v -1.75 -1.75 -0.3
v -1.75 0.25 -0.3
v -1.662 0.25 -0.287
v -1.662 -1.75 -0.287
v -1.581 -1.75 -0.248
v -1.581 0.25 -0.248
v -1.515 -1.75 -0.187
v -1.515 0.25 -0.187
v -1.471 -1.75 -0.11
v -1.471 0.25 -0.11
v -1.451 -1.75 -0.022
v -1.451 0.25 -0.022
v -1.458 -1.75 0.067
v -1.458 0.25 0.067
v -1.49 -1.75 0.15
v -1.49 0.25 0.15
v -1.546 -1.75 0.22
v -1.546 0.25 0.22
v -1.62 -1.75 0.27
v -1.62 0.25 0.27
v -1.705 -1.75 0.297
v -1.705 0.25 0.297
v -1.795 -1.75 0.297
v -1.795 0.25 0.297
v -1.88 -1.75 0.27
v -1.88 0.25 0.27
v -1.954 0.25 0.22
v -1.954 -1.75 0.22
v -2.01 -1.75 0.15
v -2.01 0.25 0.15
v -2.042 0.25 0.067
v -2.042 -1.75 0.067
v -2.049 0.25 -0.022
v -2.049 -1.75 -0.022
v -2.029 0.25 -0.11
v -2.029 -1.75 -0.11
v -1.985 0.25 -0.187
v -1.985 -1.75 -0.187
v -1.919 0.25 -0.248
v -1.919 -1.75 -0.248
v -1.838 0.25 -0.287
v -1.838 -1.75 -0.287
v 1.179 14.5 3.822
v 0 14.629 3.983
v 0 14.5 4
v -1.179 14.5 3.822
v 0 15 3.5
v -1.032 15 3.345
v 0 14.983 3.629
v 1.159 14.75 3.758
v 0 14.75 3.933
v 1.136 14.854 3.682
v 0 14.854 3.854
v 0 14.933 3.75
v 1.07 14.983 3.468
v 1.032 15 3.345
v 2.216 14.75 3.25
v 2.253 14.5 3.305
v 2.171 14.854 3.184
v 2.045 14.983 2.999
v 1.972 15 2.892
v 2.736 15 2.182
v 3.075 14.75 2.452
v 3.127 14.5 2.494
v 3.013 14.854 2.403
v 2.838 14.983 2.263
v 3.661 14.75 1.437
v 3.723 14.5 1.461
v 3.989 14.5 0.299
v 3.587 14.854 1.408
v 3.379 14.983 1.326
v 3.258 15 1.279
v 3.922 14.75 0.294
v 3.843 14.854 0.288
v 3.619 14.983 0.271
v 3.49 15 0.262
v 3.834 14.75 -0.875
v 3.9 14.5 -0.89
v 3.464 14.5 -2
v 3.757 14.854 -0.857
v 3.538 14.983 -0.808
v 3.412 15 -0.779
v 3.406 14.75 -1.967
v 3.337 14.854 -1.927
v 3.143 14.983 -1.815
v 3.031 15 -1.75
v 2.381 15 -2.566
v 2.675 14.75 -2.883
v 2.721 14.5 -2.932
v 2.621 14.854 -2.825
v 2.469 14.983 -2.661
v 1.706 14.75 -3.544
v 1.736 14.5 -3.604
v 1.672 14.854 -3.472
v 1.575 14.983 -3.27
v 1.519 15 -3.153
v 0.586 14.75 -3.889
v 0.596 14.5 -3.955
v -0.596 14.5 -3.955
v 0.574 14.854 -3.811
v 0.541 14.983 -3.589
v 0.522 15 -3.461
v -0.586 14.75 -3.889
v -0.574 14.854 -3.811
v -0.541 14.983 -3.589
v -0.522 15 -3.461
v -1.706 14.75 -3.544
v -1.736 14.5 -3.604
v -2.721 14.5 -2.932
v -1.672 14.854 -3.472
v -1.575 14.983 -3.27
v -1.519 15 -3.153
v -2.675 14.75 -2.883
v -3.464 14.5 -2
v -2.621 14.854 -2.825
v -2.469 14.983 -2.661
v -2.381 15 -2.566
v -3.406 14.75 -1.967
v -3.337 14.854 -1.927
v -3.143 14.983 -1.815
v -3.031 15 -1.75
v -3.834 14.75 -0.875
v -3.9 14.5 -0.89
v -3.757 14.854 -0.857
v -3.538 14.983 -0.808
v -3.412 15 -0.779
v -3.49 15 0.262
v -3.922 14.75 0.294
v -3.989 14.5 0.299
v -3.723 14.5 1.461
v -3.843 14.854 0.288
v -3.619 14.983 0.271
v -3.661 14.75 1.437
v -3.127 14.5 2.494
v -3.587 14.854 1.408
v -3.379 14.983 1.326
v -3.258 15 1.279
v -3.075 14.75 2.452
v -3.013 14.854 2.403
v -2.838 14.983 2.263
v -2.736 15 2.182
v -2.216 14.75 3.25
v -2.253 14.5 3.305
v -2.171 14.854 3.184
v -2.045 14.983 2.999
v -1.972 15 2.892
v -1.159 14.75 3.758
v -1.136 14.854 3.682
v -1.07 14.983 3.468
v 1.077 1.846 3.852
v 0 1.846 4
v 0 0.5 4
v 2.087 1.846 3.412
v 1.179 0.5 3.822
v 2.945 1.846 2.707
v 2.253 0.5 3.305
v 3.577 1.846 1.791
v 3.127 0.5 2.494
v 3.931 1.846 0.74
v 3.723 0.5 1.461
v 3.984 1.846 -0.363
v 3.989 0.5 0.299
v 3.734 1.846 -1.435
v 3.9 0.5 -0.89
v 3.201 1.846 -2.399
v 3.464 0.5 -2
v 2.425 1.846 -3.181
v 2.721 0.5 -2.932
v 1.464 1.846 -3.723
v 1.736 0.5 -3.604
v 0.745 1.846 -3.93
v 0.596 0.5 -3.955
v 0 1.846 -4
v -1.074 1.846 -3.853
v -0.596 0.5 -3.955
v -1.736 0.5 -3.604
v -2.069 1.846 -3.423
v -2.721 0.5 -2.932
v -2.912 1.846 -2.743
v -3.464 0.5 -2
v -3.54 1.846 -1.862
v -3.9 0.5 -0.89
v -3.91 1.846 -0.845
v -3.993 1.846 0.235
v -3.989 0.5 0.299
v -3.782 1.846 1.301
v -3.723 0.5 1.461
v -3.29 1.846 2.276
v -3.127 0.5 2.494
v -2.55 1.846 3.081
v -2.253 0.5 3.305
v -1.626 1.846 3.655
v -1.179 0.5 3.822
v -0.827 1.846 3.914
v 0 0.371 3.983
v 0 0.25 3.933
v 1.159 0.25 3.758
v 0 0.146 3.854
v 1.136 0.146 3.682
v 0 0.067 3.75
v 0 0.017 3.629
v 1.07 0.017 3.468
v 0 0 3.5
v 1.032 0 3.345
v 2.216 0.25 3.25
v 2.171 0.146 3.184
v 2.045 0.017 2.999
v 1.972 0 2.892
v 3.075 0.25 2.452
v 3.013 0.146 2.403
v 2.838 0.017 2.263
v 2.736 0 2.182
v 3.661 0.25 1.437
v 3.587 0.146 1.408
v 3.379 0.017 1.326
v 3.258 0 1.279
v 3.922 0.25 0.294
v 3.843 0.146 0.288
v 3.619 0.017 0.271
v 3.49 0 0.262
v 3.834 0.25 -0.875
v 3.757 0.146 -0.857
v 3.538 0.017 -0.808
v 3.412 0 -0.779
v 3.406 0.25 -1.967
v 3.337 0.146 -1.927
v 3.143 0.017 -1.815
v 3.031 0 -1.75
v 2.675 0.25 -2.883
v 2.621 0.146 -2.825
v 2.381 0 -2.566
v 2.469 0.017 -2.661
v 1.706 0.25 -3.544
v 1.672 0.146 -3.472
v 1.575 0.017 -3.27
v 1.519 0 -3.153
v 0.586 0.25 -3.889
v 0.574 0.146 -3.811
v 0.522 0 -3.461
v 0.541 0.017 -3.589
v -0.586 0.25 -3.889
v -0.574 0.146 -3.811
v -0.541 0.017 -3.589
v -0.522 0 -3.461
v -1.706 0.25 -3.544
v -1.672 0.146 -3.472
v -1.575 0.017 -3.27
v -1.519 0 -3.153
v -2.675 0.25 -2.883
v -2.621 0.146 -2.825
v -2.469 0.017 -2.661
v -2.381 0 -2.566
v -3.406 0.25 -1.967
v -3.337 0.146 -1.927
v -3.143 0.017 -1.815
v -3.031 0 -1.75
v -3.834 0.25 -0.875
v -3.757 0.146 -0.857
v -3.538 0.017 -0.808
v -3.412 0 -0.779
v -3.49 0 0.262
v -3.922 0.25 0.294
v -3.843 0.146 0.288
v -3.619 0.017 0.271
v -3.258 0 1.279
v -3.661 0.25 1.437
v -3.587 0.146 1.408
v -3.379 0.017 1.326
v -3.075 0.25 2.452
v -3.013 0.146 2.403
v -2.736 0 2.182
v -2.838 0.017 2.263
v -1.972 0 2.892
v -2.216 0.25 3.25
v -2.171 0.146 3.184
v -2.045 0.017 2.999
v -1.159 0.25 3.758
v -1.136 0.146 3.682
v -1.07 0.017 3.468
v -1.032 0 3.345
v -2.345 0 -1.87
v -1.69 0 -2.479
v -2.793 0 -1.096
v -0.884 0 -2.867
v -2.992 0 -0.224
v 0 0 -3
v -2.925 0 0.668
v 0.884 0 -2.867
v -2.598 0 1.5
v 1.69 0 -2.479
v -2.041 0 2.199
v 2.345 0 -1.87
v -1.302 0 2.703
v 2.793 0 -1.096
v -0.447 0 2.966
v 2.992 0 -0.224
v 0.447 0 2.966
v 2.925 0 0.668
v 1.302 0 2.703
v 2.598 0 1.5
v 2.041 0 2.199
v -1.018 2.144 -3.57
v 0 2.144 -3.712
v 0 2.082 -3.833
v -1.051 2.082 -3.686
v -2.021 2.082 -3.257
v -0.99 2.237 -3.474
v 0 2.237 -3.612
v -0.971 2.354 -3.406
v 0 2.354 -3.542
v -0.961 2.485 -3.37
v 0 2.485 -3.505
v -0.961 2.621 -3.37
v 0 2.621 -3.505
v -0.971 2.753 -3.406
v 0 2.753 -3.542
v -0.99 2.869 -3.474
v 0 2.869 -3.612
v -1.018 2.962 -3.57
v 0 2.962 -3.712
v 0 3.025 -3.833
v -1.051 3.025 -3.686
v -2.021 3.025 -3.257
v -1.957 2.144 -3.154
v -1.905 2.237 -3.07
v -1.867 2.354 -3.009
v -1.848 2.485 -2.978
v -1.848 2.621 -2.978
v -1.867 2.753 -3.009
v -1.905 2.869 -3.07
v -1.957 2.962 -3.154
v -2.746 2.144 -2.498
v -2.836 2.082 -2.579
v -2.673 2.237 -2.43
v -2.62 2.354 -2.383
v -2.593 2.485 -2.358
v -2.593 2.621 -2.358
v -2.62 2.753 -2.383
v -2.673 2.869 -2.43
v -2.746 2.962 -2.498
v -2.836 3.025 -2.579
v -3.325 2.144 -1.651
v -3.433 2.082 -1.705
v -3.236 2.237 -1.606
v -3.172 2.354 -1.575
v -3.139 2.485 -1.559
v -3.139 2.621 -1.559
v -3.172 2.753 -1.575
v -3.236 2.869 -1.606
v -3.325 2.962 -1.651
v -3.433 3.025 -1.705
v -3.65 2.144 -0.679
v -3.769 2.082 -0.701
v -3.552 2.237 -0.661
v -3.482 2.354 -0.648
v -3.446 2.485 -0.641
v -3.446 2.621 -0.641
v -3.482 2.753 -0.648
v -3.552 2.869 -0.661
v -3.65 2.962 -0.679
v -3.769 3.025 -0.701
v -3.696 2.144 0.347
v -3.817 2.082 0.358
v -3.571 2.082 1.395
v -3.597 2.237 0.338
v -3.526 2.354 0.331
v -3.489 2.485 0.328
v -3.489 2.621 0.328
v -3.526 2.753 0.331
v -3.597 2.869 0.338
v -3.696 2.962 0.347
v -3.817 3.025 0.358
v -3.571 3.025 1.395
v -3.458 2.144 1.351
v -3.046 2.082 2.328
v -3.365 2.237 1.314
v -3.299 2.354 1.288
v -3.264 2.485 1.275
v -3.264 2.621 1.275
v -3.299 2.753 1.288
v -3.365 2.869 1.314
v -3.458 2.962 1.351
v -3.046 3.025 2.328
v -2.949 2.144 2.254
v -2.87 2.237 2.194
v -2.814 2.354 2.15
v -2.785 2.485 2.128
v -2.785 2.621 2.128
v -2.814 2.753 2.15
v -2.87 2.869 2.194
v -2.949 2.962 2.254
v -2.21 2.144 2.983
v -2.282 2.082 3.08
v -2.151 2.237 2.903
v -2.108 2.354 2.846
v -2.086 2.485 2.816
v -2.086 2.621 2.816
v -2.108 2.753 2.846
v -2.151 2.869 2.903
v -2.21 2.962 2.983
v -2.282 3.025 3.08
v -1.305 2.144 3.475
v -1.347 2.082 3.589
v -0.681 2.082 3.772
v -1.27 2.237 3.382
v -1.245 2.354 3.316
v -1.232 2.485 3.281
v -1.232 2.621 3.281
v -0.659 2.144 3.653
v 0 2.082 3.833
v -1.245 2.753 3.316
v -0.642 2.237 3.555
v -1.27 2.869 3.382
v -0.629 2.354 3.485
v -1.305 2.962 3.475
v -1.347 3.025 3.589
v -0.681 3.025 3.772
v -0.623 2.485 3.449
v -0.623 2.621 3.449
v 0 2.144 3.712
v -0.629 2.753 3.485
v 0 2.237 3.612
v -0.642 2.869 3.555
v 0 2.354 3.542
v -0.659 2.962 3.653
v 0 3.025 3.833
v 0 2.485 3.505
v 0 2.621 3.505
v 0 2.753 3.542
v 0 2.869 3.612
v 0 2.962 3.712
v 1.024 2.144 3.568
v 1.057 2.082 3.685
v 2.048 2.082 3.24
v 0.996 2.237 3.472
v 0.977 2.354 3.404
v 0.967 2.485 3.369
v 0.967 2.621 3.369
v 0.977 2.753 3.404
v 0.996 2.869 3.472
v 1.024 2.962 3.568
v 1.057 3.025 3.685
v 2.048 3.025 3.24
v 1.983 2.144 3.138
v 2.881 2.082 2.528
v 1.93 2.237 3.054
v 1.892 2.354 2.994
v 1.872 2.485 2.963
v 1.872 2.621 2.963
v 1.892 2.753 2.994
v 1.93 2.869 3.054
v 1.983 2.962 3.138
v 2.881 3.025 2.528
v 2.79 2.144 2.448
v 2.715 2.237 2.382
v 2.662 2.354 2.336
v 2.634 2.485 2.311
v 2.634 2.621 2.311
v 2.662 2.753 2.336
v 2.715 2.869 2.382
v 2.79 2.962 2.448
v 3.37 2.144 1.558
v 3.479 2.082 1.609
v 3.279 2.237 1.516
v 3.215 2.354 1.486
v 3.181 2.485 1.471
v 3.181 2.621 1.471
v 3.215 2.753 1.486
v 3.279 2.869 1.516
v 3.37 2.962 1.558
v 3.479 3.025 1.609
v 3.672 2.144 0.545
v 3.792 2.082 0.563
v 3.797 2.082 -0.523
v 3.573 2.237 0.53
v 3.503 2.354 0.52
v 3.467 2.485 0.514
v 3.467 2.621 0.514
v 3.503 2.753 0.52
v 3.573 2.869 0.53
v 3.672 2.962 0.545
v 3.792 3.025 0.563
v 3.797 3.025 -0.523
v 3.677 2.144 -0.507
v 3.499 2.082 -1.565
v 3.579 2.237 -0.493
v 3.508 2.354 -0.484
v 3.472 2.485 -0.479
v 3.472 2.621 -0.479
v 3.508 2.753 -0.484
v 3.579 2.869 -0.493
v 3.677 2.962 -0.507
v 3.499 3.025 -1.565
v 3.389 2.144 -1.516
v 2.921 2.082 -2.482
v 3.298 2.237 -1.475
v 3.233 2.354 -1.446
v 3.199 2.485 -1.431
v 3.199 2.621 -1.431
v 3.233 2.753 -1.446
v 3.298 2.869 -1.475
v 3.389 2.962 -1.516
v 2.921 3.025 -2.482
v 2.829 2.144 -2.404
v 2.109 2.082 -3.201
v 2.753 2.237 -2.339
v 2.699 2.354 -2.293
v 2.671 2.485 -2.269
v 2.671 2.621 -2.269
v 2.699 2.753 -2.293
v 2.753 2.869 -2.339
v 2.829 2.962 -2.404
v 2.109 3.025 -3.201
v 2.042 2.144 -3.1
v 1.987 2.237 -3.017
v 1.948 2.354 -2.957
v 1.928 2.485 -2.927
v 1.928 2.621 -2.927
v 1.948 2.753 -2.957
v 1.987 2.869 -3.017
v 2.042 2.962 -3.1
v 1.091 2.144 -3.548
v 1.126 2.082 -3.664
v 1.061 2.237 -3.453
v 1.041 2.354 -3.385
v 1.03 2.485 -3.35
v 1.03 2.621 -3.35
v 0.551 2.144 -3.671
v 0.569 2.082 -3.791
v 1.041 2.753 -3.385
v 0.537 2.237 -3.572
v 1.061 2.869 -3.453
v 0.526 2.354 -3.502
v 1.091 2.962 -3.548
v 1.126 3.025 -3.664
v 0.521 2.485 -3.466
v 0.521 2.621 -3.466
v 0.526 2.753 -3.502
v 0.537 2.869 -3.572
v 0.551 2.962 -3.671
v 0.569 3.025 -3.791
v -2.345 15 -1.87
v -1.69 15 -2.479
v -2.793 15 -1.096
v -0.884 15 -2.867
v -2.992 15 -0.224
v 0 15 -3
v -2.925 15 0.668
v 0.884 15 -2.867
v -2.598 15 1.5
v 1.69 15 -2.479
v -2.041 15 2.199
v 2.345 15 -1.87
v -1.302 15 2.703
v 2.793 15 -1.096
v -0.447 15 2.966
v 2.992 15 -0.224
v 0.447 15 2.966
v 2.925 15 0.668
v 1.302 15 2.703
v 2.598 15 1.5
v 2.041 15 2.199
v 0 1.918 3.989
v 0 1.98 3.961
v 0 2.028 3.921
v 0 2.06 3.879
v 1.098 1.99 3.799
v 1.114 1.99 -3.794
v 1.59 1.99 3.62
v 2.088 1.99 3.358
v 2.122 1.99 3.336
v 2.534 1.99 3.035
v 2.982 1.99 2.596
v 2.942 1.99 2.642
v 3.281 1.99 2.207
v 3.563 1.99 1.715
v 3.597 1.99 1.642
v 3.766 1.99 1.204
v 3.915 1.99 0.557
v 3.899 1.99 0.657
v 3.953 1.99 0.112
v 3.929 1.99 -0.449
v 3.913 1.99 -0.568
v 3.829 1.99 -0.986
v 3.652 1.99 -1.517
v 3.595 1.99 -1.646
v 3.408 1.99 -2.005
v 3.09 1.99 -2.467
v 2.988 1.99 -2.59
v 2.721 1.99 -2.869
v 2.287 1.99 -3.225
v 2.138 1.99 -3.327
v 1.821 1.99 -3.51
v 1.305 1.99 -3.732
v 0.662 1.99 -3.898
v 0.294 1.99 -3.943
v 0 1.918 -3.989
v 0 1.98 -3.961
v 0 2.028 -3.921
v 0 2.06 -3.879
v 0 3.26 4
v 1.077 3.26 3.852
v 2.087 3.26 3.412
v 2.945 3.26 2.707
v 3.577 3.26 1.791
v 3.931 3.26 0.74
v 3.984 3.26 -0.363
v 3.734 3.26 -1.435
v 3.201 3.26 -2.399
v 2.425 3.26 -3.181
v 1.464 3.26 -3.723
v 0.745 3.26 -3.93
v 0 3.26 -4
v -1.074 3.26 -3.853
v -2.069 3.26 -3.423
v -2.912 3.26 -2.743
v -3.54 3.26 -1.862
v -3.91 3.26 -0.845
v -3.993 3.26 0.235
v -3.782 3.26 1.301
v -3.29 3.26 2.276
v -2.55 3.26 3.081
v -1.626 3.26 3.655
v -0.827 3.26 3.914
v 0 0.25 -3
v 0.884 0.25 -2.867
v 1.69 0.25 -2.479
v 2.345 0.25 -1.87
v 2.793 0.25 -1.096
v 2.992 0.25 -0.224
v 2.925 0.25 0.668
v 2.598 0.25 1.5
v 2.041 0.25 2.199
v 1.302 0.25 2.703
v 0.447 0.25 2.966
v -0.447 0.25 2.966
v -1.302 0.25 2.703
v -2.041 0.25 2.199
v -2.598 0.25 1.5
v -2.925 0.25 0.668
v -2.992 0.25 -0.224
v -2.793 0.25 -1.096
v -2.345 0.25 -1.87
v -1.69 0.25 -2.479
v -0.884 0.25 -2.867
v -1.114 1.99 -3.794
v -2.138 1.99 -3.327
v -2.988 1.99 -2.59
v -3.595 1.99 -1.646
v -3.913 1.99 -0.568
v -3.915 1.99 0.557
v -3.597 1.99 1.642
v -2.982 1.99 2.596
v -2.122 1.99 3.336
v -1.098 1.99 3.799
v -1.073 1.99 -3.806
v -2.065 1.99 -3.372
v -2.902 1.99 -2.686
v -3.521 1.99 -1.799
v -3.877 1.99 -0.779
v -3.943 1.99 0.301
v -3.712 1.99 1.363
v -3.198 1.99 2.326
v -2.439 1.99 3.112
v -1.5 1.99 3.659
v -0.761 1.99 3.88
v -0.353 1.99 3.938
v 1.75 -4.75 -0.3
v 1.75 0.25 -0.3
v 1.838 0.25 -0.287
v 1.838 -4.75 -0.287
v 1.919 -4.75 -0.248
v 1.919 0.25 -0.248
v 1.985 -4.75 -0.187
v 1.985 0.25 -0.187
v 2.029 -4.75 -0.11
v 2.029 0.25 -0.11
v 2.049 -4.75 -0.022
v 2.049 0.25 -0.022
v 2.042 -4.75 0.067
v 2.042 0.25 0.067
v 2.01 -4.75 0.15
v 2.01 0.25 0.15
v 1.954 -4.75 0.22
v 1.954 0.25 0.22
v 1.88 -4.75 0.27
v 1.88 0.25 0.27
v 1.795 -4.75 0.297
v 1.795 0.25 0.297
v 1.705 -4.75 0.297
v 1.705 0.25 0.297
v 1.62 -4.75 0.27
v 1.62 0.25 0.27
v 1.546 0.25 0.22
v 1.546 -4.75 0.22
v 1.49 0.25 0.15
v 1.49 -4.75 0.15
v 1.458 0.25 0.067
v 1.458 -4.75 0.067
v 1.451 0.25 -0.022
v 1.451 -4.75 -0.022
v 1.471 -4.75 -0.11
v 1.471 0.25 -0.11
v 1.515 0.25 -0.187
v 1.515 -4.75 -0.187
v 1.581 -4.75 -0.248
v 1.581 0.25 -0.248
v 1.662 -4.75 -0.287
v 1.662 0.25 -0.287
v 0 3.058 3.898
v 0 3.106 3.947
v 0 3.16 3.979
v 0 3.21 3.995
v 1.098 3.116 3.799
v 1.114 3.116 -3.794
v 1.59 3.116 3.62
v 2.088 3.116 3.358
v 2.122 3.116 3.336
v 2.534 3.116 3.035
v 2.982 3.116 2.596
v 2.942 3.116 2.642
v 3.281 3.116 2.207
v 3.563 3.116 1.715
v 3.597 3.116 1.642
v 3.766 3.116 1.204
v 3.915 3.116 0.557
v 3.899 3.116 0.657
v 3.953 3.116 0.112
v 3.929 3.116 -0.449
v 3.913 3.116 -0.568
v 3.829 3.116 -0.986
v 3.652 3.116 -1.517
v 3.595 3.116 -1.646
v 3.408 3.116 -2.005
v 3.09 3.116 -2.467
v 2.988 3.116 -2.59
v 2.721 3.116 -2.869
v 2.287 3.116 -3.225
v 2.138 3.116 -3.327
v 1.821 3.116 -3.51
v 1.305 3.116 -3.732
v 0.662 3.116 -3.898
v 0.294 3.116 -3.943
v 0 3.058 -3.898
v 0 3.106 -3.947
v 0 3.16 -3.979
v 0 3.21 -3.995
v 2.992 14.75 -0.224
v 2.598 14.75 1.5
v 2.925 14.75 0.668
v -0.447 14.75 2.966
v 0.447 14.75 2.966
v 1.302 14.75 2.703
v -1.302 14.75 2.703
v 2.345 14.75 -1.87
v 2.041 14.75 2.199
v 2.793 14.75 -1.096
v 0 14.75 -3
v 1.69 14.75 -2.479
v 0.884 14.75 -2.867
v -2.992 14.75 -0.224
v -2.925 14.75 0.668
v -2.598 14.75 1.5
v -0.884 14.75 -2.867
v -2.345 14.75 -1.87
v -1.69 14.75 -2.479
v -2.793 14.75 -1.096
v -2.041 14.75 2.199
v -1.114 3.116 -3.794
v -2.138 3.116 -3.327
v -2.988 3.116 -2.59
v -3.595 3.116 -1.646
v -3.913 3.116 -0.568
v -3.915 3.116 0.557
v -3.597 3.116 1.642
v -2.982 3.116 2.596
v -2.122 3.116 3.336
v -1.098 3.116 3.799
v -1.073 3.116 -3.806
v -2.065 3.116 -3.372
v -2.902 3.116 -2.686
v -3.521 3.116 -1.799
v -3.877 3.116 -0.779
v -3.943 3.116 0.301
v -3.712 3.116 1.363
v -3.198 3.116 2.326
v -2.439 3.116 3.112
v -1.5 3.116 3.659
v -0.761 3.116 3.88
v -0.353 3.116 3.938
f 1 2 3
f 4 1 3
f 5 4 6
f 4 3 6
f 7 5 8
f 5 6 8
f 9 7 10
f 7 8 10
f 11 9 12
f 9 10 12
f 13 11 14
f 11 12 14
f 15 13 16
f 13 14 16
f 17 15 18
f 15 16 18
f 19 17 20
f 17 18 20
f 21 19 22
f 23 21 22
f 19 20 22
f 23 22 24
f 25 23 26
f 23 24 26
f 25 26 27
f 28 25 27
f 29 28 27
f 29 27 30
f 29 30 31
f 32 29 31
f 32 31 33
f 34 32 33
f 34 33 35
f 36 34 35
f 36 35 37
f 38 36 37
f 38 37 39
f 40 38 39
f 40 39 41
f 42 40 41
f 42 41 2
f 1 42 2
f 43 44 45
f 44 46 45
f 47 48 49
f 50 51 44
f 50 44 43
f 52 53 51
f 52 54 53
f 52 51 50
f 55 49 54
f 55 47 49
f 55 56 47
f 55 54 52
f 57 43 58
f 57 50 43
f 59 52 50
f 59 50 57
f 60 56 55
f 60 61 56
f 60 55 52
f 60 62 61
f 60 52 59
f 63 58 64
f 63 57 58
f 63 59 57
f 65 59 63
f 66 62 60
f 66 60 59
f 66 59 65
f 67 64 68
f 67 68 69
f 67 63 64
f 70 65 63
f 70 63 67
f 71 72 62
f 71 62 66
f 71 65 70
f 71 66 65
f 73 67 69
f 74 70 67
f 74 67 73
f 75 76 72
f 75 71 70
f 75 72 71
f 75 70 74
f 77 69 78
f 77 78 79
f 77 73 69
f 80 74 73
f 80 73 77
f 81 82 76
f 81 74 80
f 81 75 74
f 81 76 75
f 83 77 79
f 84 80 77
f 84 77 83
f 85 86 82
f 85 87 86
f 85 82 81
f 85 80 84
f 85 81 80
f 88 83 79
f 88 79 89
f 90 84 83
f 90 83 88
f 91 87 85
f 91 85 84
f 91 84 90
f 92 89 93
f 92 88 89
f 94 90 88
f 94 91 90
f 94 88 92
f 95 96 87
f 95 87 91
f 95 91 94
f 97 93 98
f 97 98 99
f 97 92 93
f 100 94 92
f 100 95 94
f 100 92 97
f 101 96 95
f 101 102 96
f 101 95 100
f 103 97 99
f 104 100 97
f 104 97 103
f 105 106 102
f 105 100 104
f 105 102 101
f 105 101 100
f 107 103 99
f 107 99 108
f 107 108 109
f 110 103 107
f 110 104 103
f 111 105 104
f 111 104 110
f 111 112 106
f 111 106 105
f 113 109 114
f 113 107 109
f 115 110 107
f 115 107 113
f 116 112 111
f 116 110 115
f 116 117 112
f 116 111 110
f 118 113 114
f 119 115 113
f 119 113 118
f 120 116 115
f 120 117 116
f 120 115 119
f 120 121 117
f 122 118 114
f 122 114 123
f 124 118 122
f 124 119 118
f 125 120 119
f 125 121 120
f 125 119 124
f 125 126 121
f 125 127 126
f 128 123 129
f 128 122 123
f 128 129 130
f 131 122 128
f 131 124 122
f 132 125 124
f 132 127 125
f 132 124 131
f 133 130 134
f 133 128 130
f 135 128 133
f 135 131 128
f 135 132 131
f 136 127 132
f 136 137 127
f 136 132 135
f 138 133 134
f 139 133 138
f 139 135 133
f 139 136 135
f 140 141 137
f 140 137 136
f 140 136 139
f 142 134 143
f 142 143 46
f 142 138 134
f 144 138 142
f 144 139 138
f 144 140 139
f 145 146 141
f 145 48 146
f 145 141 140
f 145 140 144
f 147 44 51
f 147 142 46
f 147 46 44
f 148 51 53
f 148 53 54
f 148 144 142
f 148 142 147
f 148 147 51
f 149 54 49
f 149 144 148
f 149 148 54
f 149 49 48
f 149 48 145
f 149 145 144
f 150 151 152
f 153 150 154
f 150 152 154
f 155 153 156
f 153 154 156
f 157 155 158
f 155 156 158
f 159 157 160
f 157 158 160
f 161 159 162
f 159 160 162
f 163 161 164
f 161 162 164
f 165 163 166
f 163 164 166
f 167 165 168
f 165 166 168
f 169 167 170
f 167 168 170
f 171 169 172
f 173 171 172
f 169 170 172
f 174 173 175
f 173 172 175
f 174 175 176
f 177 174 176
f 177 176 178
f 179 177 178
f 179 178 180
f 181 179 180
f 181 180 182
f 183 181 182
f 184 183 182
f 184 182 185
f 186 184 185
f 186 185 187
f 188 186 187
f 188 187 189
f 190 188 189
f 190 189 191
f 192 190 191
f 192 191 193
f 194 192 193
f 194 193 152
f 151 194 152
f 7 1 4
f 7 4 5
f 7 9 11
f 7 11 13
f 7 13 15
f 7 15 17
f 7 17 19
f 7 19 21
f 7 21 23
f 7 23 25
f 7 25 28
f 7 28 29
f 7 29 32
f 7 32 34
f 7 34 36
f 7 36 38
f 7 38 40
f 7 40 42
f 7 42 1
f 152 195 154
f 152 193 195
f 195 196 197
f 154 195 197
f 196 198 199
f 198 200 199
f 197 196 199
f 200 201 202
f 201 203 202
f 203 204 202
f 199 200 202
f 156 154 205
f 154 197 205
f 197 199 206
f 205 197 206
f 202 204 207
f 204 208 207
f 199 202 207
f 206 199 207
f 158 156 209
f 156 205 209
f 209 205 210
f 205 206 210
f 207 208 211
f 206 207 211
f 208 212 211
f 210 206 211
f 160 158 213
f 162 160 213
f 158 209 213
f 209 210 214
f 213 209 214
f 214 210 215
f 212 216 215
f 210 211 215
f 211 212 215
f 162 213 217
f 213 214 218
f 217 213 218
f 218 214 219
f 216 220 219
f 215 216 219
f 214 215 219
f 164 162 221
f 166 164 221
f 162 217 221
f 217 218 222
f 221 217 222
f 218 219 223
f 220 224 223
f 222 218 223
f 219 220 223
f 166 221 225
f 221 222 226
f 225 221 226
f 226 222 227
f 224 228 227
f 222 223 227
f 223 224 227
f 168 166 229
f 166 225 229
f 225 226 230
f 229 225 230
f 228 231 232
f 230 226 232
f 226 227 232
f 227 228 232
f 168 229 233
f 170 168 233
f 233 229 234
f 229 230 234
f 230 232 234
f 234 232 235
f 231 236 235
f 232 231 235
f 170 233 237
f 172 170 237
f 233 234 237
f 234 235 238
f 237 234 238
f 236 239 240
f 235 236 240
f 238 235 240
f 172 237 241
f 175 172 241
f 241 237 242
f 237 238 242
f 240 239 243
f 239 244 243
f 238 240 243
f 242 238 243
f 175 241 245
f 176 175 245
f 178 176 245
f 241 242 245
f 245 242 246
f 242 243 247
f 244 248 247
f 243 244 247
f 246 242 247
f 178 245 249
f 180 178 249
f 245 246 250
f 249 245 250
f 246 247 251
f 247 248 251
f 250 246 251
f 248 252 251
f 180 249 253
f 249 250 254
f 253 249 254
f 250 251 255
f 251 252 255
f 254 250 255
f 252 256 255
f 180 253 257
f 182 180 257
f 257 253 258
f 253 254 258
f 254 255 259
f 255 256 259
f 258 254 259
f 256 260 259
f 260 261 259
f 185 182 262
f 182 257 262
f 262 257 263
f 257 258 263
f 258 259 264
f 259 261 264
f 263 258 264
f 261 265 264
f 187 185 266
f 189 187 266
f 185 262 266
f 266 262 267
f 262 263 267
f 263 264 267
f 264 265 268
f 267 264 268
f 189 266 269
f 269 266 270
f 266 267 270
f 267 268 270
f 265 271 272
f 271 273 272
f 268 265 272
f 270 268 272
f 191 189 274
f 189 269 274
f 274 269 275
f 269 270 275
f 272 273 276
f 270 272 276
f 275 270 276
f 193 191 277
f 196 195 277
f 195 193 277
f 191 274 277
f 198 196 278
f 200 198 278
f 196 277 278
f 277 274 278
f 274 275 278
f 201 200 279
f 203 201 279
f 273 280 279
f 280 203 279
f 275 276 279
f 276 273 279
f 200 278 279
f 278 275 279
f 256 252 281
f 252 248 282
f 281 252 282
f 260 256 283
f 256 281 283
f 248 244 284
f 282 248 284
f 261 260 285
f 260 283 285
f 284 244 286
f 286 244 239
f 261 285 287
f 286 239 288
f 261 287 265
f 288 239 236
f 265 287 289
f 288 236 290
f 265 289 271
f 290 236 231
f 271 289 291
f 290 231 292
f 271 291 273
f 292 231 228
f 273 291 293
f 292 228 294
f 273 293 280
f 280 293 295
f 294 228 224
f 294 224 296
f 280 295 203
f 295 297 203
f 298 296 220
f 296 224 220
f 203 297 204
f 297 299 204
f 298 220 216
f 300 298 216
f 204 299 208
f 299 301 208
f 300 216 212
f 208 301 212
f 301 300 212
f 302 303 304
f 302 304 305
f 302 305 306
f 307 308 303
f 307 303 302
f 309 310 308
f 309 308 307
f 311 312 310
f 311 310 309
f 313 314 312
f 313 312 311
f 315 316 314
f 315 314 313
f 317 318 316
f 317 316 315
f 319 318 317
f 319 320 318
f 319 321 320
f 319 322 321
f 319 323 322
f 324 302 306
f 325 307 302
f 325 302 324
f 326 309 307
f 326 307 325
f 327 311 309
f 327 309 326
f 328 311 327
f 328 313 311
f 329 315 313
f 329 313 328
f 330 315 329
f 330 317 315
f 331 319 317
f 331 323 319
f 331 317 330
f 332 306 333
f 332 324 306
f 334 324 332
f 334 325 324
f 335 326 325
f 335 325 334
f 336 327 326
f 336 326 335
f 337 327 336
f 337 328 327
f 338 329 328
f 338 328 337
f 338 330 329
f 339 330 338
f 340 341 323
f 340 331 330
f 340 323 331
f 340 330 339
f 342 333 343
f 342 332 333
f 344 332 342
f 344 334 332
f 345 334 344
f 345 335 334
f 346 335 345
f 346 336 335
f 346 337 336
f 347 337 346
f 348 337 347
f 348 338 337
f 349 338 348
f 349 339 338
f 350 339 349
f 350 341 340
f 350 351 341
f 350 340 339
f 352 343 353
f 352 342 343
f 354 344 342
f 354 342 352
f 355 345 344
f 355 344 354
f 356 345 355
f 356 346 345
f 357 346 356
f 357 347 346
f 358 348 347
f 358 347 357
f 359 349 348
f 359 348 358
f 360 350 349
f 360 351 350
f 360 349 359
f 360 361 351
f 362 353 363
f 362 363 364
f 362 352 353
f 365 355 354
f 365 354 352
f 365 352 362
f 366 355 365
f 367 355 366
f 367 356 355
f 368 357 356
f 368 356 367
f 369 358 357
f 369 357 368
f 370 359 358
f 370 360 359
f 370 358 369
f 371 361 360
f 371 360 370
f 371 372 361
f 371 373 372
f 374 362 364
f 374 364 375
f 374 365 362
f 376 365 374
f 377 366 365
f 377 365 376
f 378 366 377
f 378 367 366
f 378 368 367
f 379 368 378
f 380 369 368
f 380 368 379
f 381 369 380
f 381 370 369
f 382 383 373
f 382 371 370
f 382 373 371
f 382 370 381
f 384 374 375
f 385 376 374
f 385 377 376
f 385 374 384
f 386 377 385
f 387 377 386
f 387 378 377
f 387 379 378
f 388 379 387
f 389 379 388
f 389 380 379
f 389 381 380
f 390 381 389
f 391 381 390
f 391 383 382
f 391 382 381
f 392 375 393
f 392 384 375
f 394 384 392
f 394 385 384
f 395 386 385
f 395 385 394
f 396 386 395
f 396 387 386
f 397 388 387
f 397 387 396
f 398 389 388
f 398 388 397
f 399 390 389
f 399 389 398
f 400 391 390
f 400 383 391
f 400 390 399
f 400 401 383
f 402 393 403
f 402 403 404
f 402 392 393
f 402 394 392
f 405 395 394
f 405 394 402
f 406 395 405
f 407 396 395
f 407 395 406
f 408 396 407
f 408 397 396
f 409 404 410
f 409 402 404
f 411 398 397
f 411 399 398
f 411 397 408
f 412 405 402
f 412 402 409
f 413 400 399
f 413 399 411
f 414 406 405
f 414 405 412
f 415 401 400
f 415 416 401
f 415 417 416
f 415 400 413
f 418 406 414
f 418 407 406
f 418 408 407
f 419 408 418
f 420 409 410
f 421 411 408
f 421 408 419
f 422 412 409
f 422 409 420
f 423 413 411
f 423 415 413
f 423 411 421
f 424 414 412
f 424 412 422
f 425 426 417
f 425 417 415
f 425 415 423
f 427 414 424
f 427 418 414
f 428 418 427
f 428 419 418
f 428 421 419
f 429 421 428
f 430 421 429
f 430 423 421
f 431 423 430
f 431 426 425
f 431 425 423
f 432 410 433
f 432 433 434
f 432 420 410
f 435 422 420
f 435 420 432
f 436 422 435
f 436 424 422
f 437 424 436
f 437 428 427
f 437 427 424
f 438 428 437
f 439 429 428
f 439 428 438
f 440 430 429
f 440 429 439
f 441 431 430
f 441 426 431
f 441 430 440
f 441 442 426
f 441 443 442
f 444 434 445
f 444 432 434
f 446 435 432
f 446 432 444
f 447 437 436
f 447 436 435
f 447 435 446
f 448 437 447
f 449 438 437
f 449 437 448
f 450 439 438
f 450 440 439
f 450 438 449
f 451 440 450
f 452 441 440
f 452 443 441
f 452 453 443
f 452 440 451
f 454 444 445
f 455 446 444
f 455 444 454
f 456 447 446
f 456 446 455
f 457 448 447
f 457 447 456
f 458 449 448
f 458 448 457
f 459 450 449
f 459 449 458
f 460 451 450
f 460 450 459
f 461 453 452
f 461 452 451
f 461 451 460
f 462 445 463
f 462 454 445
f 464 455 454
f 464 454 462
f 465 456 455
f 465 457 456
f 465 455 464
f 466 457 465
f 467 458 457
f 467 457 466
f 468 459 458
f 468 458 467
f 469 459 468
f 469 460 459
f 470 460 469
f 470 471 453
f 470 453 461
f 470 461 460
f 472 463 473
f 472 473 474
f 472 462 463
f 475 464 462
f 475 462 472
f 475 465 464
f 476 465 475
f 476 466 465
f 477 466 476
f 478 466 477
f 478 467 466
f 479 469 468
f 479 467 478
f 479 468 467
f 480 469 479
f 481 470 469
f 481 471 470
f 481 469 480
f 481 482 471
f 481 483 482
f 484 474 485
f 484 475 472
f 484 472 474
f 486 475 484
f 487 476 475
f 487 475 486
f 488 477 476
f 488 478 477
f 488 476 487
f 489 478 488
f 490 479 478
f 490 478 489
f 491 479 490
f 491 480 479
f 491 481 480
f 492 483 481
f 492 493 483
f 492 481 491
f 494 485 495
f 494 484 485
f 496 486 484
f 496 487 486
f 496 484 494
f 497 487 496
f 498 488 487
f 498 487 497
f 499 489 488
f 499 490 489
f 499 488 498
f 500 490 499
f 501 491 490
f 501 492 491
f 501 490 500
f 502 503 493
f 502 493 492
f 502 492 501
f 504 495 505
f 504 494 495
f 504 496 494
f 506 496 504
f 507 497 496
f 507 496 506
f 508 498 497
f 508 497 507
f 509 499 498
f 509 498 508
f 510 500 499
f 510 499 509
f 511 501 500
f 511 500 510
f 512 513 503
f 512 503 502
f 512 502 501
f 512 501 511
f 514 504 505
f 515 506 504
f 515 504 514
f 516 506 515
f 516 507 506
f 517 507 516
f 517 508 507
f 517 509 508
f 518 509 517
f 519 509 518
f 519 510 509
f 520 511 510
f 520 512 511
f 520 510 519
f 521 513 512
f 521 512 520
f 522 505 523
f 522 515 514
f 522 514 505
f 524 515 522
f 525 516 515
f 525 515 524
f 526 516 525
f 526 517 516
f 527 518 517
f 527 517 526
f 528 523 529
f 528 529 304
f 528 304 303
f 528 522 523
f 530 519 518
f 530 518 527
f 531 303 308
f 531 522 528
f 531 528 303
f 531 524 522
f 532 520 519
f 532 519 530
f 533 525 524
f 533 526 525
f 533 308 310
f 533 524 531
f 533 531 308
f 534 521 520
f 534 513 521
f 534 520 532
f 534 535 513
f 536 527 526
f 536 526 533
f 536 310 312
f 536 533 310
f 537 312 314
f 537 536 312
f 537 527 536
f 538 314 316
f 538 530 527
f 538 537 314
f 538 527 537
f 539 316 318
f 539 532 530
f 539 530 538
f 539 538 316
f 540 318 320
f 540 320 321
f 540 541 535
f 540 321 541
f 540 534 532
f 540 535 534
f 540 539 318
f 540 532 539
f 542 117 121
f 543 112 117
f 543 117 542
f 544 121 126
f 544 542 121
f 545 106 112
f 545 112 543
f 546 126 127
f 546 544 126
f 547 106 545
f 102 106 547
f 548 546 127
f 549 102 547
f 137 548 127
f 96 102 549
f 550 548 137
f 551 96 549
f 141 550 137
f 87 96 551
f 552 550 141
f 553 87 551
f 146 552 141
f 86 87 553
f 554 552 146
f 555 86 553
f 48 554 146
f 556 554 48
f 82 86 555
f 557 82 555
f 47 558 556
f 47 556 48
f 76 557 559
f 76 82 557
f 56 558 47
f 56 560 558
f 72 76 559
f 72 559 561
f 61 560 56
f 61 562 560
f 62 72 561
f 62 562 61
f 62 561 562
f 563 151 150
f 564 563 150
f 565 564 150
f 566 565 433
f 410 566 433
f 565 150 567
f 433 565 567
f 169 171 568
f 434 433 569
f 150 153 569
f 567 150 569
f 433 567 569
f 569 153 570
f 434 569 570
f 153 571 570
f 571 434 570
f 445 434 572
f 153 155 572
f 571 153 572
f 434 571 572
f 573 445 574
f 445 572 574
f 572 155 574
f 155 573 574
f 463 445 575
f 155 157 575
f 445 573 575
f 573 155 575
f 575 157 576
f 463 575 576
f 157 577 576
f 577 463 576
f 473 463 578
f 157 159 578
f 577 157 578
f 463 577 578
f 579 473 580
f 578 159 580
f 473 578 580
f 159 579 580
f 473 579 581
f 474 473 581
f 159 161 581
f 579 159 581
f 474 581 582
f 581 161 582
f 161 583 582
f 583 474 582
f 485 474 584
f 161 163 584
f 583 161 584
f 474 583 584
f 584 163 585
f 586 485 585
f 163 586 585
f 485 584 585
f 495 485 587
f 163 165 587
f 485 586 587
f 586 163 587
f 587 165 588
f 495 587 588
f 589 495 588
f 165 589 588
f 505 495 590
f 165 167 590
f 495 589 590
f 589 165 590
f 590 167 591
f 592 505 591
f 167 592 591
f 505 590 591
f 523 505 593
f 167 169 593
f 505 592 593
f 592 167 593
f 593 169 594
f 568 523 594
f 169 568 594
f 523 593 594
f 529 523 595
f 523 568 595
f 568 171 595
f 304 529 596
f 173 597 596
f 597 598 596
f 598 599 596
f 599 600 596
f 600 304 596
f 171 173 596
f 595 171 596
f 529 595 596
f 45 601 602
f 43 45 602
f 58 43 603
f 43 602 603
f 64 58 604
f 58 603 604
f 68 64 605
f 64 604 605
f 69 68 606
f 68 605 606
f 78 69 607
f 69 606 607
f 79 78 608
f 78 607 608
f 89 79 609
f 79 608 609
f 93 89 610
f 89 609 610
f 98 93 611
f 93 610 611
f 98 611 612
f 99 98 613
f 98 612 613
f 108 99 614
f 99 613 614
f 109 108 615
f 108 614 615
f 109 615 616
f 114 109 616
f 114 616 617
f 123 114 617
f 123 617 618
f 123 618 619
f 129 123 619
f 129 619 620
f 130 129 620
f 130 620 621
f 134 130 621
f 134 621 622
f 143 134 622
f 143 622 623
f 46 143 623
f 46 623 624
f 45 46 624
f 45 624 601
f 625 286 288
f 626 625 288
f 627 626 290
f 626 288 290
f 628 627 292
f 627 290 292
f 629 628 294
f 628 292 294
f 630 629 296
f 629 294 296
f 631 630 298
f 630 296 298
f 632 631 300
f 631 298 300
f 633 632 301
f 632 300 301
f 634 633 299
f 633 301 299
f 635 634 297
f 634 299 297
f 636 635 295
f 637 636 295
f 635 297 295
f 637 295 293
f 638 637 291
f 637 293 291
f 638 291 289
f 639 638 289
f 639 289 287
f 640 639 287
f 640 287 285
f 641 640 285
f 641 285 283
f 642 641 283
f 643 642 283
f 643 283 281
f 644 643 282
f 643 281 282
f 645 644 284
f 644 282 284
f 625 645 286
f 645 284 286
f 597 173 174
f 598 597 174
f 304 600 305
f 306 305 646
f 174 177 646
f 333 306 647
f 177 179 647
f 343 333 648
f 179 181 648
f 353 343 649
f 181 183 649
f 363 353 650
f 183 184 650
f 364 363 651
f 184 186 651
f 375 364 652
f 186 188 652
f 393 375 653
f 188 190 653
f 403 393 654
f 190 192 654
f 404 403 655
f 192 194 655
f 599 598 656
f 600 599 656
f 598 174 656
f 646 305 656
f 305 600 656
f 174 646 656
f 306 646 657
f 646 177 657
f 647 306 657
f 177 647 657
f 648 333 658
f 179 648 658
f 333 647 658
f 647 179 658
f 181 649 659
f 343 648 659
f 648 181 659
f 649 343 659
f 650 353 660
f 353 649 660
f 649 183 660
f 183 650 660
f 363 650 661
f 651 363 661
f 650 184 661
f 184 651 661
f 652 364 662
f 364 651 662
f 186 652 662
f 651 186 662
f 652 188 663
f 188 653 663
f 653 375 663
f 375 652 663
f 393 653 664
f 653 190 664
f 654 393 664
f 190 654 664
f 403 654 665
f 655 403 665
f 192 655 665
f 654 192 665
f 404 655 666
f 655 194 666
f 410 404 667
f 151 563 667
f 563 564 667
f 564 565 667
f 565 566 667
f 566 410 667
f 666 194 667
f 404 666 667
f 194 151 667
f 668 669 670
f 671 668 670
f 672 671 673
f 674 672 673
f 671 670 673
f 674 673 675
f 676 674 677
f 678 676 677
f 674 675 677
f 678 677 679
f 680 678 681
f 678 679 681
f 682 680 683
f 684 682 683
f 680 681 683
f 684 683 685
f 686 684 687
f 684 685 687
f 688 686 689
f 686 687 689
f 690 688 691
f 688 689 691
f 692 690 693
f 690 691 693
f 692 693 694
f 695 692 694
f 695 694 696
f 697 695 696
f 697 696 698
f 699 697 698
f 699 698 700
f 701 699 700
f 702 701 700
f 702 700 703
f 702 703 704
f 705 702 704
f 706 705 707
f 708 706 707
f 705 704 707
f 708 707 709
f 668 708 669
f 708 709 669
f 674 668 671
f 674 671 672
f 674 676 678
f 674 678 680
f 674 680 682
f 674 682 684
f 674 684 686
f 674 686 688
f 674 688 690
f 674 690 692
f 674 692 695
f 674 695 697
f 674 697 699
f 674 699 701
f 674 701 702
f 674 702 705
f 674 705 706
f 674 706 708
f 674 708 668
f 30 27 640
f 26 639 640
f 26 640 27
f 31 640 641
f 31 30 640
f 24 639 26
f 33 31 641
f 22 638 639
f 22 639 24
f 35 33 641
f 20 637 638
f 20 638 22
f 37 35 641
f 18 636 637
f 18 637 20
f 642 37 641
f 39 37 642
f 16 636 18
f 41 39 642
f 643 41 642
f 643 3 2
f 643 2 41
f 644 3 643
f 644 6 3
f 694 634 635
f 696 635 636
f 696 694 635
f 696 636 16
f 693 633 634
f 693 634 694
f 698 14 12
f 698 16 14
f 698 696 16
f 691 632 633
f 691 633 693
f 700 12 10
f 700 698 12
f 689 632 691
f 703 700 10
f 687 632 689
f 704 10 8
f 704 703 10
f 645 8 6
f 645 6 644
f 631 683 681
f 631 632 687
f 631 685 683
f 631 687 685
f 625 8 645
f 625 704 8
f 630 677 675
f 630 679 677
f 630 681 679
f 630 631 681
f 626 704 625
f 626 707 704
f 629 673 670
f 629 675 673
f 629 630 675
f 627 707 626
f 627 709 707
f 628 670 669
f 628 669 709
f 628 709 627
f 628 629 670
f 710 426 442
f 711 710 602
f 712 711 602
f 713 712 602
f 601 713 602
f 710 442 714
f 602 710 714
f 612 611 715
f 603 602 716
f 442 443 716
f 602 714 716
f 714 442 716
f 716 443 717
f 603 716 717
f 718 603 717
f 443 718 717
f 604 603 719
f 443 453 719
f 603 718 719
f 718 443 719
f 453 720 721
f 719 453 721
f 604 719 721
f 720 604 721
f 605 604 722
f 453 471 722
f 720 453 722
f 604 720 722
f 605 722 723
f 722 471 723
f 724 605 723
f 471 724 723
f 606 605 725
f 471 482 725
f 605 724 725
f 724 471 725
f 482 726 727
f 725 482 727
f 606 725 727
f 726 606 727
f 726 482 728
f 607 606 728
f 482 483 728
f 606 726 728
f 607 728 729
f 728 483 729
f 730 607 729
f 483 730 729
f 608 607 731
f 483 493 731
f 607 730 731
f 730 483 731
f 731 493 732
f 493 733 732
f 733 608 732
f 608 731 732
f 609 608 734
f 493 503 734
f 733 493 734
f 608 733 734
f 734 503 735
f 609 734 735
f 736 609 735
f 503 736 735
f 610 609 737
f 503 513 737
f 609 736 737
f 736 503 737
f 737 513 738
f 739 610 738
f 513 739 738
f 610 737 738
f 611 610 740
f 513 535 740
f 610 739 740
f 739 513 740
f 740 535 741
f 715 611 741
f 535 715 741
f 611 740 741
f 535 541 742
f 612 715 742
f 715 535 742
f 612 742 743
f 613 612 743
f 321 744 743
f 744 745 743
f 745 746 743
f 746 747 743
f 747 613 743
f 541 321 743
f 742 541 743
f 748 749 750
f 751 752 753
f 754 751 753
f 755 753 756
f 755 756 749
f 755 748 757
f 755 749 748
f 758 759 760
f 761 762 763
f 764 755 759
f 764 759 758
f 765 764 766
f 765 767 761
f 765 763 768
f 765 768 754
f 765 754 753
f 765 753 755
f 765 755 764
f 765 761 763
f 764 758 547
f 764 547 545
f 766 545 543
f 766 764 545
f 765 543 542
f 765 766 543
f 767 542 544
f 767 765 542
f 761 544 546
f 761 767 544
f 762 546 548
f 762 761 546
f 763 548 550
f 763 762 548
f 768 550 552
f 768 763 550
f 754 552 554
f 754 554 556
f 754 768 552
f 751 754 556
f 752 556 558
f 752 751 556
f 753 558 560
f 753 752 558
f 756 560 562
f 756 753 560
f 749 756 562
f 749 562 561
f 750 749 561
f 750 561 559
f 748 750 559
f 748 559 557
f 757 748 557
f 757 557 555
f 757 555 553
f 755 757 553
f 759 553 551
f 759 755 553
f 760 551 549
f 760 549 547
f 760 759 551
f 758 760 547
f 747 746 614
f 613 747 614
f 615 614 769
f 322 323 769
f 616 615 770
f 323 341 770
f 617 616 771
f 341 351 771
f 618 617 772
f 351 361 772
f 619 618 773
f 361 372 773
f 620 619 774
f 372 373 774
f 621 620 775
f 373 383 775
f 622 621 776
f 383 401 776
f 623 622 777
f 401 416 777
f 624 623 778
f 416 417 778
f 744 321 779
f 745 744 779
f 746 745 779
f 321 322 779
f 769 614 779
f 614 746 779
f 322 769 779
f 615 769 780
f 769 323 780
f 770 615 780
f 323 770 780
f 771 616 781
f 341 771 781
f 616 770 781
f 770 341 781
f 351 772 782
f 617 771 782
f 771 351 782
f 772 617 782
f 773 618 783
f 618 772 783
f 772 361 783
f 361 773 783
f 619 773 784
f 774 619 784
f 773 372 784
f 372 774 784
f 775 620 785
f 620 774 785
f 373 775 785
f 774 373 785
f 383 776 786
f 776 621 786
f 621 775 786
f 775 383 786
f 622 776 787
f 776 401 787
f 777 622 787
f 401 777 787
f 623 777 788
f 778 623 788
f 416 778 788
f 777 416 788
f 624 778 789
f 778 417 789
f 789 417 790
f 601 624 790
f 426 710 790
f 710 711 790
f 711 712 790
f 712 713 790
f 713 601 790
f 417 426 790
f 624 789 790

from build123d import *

# Parameters (mm, degrees)
SKETCH1_R           = 4
BASE_EXTRUDE_DEPTH  = 15
FILLET1_R           = 0.5
FILLET2_R           = 0.25
SKETCH4_R           = 3
CUT_EXTRUDE1_DEPTH  = 0.25
SKETCH3_R           = 0.3
BOSS_EXTRUDE1_DEPTH = 5
CUT_EXTRUDE2_START  = -3
SKETCH5_R           = 0.3
CUT_EXTRUDE2_DEPTH  = 3
CUT_EXTRUDE3_START  = -0.25
SKETCH6_R           = 3
CUT_EXTRUDE3_DEPTH  = 0.25


with BuildPart() as part:
    # Sketch1 → Base-Extrude (new body)
    with BuildSketch(Plane(origin=(0, 0, 0), x_dir=(1, 0, 0), z_dir=(0, 1, 0))):
        with Locations(Location((0, 0, 0), (0, 0, 270))):
            Circle(SKETCH1_R)
    extrude(amount=BASE_EXTRUDE_DEPTH)

    # Sketch2 → Cut-Revolve1 (revolve, cut)
    with BuildSketch(Plane(origin=(0, 0, 0), x_dir=(0, 0, -1), z_dir=(1, 0, 0)), mode=Mode.PRIVATE) as cut_revolve1_sk:
        with BuildLine():
            Line((-4, 3.053185949), (-4, 2.053185949))
            ThreePointArc((-4, 2.053185949), (-3.5, 2.553185949), (-4, 3.053185949))
        make_face()
    revolve(cut_revolve1_sk.sketch.rotate(Axis((0, 0, 0), (0, 1, 0)), 180), axis=Axis((0, 0, 0), (0, 1, 0)), mode=Mode.SUBTRACT)

    # Fillet1
    fillet1_edges = [part.edges().sort_by_distance(p)[0] for p in [
        (0, 0, -4),
        (0, 15, -4),
    ]]
    fillet(fillet1_edges, radius=FILLET1_R)

    # Fillet2
    fillet2_edges = [part.edges().sort_by_distance(p)[0] for p in [
        (-4, 2.053185949, 0),
        (-4, 3.053185949, 0),
    ]]
    fillet(fillet2_edges, radius=FILLET2_R)

    # Sketch4 → Cut-Extrude1 (cut)
    with BuildSketch(Plane.XZ):
        with Locations(Location((0, 0, 0), (0, 0, 270))):
            Circle(SKETCH4_R)
    extrude(amount=-CUT_EXTRUDE1_DEPTH, mode=Mode.SUBTRACT)

    # Sketch3 → Boss-Extrude1 (add)
    with BuildSketch(Plane.XZ.offset(-0.25)):
        with Locations(Location((-1.75, 0, 0), (0, 0, 270))):
            Circle(SKETCH3_R)
        with Locations(Location((1.75, 0, 0), (0, 0, 270))):
            Circle(SKETCH3_R)
    extrude(amount=BOSS_EXTRUDE1_DEPTH)

    # Sketch5 → Cut-Extrude2 (cut)
    with BuildSketch(Plane.XZ.offset(4.75).offset(CUT_EXTRUDE2_START)):
        with Locations(Location((-1.75, 0, 0), (0, 0, 270))):
            Circle(SKETCH5_R)
    extrude(amount=CUT_EXTRUDE2_DEPTH, mode=Mode.SUBTRACT)

    # Sketch6 → Cut-Extrude3 (cut)
    with BuildSketch(Plane(origin=(0, 15, 0), x_dir=(-1, 0, 0), z_dir=(0, 1, 0)).offset(CUT_EXTRUDE3_START)):
        with Locations(Location((0, 0, 0), (0, 0, 270))):
            Circle(SKETCH6_R)
    extrude(amount=CUT_EXTRUDE3_DEPTH, mode=Mode.SUBTRACT)


solid = part.part
